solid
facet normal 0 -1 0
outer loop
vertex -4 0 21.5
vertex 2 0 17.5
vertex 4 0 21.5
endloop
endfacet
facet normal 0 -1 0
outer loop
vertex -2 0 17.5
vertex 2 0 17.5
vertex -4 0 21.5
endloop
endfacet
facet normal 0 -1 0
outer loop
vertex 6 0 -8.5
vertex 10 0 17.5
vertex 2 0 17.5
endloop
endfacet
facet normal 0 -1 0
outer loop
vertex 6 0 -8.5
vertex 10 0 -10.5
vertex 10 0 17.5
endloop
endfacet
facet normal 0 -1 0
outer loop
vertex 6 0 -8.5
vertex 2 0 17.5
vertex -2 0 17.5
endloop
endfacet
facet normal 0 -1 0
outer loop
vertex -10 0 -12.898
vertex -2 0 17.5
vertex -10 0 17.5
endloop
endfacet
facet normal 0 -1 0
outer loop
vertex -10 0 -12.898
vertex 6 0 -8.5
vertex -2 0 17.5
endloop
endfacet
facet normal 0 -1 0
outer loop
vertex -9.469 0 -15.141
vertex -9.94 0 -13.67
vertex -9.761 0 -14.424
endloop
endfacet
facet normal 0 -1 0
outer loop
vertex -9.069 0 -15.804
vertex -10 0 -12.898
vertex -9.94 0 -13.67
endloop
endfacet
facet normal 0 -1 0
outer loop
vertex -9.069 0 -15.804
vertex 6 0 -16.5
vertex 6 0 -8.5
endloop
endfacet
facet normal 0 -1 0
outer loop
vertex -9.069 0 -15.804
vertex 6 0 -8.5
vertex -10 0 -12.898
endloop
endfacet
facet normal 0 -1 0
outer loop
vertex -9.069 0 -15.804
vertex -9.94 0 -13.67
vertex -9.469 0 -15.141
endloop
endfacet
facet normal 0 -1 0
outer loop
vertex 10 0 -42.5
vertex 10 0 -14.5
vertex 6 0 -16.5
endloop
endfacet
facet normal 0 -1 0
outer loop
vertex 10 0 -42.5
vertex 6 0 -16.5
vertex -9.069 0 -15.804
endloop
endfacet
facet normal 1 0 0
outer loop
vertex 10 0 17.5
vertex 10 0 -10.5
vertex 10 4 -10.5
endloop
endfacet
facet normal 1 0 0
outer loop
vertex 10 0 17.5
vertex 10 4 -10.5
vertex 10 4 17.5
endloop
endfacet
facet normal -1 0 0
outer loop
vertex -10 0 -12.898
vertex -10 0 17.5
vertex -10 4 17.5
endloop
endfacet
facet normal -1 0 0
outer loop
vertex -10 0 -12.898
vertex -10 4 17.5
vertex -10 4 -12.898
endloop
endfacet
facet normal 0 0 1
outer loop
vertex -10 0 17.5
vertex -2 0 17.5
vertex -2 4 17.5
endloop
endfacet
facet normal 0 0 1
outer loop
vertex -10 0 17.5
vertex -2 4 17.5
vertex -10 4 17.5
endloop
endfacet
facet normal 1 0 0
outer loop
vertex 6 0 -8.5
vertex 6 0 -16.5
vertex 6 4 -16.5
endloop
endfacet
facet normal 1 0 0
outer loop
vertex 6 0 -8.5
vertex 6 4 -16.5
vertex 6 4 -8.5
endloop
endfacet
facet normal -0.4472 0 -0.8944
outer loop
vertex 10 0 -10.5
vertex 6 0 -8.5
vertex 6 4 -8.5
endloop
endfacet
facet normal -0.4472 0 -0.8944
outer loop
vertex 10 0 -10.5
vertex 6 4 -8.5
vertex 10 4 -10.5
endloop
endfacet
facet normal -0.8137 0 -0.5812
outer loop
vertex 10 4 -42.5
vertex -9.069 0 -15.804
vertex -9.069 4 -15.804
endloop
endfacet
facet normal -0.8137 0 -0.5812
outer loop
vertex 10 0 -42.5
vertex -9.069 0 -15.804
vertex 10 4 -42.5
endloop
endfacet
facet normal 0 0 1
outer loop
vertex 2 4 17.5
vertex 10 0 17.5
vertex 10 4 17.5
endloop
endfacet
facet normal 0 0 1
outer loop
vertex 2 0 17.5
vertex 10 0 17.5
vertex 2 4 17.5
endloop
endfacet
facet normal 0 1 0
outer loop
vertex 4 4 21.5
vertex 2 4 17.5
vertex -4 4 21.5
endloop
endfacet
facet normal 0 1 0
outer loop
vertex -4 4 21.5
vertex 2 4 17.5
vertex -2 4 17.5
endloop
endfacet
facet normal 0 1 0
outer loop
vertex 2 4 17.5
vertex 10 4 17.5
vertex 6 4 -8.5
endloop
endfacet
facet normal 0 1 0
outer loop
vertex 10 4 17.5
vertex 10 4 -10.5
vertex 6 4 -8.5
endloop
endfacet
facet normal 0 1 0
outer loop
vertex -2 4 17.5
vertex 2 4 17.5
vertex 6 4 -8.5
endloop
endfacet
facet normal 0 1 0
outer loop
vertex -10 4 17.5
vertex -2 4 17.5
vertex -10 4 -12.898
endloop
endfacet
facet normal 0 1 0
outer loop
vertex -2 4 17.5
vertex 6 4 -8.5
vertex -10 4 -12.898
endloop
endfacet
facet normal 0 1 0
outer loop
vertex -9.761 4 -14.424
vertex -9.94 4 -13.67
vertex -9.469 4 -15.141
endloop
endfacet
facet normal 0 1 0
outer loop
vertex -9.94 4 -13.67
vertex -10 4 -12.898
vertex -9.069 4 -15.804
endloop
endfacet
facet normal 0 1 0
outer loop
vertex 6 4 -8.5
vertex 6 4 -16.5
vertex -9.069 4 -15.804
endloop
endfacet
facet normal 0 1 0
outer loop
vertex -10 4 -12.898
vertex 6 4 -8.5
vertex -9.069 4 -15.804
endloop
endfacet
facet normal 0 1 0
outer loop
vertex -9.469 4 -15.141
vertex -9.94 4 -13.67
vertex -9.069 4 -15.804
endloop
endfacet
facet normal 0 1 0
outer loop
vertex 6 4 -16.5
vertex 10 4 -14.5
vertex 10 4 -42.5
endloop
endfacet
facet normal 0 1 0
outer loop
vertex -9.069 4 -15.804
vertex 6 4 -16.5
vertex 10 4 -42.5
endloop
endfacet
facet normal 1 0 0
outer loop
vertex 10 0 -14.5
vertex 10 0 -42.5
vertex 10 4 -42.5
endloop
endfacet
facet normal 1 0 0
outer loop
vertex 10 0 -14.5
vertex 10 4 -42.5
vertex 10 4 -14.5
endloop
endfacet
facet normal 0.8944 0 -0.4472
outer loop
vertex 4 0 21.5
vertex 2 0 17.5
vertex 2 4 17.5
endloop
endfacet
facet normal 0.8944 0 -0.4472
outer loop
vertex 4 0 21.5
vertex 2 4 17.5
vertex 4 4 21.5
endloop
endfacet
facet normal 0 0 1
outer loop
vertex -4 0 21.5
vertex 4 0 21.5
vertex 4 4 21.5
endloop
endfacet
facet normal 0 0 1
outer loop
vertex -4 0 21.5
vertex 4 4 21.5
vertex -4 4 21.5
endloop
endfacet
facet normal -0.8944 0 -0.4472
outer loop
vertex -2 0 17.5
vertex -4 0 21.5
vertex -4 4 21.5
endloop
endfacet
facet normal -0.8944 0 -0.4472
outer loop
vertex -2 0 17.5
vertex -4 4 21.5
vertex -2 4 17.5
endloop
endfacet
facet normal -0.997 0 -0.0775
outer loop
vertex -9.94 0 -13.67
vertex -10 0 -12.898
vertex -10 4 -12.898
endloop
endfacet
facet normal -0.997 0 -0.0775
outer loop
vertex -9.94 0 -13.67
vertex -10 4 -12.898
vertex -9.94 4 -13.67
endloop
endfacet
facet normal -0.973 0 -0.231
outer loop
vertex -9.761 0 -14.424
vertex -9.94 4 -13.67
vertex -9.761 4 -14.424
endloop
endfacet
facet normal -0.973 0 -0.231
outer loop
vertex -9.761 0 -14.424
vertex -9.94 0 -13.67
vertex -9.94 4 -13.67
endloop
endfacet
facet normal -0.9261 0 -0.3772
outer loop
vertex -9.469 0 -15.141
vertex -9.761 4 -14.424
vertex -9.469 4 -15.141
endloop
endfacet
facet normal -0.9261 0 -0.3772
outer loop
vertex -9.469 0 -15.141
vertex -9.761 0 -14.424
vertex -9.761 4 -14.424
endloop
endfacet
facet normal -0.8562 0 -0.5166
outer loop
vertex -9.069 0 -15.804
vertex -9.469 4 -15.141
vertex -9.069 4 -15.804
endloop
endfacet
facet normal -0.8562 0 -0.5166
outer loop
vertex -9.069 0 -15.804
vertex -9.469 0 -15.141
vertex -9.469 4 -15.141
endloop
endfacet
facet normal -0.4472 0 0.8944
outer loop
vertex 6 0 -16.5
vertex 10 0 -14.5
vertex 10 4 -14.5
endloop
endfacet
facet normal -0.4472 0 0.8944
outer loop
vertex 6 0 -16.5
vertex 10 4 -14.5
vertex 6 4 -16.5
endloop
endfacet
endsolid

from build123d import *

# Parameters (mm, degrees)
EXTRUDE_1_DEPTH = 4


with BuildPart() as part:
    # Эскиз1 → Бобышка-Вытянуть1 (new body)
    with BuildSketch(Plane(origin=(0, 0, 0), x_dir=(1, 0, 0), z_dir=(0, 1, 0))):
        with BuildLine():
            Line((10, -17.5), (2, -17.5))
            Line((2, -17.5), (4, -21.5))
            Line((4, -21.5), (-4, -21.5))
            Line((-4, -21.5), (-2, -17.5))
            Line((-2, -17.5), (-10, -17.5))
            Line((-10, -17.5), (-10, 12.897674733))
            ThreePointArc((-10, 12.897674733), (-9.761477543, 14.423561888), (-9.068667356, 15.803865702))
            Line((-9.068667356, 15.803865702), (10, 42.5))
            Line((10, 42.5), (10, 14.5))
            Line((10, 14.5), (6, 16.5))
            Line((6, 16.5), (6, 8.5))
            Line((6, 8.5), (10, 10.5))
            Line((10, 10.5), (10, -17.5))
        make_face()
    extrude(amount=EXTRUDE_1_DEPTH)


solid = part.part
